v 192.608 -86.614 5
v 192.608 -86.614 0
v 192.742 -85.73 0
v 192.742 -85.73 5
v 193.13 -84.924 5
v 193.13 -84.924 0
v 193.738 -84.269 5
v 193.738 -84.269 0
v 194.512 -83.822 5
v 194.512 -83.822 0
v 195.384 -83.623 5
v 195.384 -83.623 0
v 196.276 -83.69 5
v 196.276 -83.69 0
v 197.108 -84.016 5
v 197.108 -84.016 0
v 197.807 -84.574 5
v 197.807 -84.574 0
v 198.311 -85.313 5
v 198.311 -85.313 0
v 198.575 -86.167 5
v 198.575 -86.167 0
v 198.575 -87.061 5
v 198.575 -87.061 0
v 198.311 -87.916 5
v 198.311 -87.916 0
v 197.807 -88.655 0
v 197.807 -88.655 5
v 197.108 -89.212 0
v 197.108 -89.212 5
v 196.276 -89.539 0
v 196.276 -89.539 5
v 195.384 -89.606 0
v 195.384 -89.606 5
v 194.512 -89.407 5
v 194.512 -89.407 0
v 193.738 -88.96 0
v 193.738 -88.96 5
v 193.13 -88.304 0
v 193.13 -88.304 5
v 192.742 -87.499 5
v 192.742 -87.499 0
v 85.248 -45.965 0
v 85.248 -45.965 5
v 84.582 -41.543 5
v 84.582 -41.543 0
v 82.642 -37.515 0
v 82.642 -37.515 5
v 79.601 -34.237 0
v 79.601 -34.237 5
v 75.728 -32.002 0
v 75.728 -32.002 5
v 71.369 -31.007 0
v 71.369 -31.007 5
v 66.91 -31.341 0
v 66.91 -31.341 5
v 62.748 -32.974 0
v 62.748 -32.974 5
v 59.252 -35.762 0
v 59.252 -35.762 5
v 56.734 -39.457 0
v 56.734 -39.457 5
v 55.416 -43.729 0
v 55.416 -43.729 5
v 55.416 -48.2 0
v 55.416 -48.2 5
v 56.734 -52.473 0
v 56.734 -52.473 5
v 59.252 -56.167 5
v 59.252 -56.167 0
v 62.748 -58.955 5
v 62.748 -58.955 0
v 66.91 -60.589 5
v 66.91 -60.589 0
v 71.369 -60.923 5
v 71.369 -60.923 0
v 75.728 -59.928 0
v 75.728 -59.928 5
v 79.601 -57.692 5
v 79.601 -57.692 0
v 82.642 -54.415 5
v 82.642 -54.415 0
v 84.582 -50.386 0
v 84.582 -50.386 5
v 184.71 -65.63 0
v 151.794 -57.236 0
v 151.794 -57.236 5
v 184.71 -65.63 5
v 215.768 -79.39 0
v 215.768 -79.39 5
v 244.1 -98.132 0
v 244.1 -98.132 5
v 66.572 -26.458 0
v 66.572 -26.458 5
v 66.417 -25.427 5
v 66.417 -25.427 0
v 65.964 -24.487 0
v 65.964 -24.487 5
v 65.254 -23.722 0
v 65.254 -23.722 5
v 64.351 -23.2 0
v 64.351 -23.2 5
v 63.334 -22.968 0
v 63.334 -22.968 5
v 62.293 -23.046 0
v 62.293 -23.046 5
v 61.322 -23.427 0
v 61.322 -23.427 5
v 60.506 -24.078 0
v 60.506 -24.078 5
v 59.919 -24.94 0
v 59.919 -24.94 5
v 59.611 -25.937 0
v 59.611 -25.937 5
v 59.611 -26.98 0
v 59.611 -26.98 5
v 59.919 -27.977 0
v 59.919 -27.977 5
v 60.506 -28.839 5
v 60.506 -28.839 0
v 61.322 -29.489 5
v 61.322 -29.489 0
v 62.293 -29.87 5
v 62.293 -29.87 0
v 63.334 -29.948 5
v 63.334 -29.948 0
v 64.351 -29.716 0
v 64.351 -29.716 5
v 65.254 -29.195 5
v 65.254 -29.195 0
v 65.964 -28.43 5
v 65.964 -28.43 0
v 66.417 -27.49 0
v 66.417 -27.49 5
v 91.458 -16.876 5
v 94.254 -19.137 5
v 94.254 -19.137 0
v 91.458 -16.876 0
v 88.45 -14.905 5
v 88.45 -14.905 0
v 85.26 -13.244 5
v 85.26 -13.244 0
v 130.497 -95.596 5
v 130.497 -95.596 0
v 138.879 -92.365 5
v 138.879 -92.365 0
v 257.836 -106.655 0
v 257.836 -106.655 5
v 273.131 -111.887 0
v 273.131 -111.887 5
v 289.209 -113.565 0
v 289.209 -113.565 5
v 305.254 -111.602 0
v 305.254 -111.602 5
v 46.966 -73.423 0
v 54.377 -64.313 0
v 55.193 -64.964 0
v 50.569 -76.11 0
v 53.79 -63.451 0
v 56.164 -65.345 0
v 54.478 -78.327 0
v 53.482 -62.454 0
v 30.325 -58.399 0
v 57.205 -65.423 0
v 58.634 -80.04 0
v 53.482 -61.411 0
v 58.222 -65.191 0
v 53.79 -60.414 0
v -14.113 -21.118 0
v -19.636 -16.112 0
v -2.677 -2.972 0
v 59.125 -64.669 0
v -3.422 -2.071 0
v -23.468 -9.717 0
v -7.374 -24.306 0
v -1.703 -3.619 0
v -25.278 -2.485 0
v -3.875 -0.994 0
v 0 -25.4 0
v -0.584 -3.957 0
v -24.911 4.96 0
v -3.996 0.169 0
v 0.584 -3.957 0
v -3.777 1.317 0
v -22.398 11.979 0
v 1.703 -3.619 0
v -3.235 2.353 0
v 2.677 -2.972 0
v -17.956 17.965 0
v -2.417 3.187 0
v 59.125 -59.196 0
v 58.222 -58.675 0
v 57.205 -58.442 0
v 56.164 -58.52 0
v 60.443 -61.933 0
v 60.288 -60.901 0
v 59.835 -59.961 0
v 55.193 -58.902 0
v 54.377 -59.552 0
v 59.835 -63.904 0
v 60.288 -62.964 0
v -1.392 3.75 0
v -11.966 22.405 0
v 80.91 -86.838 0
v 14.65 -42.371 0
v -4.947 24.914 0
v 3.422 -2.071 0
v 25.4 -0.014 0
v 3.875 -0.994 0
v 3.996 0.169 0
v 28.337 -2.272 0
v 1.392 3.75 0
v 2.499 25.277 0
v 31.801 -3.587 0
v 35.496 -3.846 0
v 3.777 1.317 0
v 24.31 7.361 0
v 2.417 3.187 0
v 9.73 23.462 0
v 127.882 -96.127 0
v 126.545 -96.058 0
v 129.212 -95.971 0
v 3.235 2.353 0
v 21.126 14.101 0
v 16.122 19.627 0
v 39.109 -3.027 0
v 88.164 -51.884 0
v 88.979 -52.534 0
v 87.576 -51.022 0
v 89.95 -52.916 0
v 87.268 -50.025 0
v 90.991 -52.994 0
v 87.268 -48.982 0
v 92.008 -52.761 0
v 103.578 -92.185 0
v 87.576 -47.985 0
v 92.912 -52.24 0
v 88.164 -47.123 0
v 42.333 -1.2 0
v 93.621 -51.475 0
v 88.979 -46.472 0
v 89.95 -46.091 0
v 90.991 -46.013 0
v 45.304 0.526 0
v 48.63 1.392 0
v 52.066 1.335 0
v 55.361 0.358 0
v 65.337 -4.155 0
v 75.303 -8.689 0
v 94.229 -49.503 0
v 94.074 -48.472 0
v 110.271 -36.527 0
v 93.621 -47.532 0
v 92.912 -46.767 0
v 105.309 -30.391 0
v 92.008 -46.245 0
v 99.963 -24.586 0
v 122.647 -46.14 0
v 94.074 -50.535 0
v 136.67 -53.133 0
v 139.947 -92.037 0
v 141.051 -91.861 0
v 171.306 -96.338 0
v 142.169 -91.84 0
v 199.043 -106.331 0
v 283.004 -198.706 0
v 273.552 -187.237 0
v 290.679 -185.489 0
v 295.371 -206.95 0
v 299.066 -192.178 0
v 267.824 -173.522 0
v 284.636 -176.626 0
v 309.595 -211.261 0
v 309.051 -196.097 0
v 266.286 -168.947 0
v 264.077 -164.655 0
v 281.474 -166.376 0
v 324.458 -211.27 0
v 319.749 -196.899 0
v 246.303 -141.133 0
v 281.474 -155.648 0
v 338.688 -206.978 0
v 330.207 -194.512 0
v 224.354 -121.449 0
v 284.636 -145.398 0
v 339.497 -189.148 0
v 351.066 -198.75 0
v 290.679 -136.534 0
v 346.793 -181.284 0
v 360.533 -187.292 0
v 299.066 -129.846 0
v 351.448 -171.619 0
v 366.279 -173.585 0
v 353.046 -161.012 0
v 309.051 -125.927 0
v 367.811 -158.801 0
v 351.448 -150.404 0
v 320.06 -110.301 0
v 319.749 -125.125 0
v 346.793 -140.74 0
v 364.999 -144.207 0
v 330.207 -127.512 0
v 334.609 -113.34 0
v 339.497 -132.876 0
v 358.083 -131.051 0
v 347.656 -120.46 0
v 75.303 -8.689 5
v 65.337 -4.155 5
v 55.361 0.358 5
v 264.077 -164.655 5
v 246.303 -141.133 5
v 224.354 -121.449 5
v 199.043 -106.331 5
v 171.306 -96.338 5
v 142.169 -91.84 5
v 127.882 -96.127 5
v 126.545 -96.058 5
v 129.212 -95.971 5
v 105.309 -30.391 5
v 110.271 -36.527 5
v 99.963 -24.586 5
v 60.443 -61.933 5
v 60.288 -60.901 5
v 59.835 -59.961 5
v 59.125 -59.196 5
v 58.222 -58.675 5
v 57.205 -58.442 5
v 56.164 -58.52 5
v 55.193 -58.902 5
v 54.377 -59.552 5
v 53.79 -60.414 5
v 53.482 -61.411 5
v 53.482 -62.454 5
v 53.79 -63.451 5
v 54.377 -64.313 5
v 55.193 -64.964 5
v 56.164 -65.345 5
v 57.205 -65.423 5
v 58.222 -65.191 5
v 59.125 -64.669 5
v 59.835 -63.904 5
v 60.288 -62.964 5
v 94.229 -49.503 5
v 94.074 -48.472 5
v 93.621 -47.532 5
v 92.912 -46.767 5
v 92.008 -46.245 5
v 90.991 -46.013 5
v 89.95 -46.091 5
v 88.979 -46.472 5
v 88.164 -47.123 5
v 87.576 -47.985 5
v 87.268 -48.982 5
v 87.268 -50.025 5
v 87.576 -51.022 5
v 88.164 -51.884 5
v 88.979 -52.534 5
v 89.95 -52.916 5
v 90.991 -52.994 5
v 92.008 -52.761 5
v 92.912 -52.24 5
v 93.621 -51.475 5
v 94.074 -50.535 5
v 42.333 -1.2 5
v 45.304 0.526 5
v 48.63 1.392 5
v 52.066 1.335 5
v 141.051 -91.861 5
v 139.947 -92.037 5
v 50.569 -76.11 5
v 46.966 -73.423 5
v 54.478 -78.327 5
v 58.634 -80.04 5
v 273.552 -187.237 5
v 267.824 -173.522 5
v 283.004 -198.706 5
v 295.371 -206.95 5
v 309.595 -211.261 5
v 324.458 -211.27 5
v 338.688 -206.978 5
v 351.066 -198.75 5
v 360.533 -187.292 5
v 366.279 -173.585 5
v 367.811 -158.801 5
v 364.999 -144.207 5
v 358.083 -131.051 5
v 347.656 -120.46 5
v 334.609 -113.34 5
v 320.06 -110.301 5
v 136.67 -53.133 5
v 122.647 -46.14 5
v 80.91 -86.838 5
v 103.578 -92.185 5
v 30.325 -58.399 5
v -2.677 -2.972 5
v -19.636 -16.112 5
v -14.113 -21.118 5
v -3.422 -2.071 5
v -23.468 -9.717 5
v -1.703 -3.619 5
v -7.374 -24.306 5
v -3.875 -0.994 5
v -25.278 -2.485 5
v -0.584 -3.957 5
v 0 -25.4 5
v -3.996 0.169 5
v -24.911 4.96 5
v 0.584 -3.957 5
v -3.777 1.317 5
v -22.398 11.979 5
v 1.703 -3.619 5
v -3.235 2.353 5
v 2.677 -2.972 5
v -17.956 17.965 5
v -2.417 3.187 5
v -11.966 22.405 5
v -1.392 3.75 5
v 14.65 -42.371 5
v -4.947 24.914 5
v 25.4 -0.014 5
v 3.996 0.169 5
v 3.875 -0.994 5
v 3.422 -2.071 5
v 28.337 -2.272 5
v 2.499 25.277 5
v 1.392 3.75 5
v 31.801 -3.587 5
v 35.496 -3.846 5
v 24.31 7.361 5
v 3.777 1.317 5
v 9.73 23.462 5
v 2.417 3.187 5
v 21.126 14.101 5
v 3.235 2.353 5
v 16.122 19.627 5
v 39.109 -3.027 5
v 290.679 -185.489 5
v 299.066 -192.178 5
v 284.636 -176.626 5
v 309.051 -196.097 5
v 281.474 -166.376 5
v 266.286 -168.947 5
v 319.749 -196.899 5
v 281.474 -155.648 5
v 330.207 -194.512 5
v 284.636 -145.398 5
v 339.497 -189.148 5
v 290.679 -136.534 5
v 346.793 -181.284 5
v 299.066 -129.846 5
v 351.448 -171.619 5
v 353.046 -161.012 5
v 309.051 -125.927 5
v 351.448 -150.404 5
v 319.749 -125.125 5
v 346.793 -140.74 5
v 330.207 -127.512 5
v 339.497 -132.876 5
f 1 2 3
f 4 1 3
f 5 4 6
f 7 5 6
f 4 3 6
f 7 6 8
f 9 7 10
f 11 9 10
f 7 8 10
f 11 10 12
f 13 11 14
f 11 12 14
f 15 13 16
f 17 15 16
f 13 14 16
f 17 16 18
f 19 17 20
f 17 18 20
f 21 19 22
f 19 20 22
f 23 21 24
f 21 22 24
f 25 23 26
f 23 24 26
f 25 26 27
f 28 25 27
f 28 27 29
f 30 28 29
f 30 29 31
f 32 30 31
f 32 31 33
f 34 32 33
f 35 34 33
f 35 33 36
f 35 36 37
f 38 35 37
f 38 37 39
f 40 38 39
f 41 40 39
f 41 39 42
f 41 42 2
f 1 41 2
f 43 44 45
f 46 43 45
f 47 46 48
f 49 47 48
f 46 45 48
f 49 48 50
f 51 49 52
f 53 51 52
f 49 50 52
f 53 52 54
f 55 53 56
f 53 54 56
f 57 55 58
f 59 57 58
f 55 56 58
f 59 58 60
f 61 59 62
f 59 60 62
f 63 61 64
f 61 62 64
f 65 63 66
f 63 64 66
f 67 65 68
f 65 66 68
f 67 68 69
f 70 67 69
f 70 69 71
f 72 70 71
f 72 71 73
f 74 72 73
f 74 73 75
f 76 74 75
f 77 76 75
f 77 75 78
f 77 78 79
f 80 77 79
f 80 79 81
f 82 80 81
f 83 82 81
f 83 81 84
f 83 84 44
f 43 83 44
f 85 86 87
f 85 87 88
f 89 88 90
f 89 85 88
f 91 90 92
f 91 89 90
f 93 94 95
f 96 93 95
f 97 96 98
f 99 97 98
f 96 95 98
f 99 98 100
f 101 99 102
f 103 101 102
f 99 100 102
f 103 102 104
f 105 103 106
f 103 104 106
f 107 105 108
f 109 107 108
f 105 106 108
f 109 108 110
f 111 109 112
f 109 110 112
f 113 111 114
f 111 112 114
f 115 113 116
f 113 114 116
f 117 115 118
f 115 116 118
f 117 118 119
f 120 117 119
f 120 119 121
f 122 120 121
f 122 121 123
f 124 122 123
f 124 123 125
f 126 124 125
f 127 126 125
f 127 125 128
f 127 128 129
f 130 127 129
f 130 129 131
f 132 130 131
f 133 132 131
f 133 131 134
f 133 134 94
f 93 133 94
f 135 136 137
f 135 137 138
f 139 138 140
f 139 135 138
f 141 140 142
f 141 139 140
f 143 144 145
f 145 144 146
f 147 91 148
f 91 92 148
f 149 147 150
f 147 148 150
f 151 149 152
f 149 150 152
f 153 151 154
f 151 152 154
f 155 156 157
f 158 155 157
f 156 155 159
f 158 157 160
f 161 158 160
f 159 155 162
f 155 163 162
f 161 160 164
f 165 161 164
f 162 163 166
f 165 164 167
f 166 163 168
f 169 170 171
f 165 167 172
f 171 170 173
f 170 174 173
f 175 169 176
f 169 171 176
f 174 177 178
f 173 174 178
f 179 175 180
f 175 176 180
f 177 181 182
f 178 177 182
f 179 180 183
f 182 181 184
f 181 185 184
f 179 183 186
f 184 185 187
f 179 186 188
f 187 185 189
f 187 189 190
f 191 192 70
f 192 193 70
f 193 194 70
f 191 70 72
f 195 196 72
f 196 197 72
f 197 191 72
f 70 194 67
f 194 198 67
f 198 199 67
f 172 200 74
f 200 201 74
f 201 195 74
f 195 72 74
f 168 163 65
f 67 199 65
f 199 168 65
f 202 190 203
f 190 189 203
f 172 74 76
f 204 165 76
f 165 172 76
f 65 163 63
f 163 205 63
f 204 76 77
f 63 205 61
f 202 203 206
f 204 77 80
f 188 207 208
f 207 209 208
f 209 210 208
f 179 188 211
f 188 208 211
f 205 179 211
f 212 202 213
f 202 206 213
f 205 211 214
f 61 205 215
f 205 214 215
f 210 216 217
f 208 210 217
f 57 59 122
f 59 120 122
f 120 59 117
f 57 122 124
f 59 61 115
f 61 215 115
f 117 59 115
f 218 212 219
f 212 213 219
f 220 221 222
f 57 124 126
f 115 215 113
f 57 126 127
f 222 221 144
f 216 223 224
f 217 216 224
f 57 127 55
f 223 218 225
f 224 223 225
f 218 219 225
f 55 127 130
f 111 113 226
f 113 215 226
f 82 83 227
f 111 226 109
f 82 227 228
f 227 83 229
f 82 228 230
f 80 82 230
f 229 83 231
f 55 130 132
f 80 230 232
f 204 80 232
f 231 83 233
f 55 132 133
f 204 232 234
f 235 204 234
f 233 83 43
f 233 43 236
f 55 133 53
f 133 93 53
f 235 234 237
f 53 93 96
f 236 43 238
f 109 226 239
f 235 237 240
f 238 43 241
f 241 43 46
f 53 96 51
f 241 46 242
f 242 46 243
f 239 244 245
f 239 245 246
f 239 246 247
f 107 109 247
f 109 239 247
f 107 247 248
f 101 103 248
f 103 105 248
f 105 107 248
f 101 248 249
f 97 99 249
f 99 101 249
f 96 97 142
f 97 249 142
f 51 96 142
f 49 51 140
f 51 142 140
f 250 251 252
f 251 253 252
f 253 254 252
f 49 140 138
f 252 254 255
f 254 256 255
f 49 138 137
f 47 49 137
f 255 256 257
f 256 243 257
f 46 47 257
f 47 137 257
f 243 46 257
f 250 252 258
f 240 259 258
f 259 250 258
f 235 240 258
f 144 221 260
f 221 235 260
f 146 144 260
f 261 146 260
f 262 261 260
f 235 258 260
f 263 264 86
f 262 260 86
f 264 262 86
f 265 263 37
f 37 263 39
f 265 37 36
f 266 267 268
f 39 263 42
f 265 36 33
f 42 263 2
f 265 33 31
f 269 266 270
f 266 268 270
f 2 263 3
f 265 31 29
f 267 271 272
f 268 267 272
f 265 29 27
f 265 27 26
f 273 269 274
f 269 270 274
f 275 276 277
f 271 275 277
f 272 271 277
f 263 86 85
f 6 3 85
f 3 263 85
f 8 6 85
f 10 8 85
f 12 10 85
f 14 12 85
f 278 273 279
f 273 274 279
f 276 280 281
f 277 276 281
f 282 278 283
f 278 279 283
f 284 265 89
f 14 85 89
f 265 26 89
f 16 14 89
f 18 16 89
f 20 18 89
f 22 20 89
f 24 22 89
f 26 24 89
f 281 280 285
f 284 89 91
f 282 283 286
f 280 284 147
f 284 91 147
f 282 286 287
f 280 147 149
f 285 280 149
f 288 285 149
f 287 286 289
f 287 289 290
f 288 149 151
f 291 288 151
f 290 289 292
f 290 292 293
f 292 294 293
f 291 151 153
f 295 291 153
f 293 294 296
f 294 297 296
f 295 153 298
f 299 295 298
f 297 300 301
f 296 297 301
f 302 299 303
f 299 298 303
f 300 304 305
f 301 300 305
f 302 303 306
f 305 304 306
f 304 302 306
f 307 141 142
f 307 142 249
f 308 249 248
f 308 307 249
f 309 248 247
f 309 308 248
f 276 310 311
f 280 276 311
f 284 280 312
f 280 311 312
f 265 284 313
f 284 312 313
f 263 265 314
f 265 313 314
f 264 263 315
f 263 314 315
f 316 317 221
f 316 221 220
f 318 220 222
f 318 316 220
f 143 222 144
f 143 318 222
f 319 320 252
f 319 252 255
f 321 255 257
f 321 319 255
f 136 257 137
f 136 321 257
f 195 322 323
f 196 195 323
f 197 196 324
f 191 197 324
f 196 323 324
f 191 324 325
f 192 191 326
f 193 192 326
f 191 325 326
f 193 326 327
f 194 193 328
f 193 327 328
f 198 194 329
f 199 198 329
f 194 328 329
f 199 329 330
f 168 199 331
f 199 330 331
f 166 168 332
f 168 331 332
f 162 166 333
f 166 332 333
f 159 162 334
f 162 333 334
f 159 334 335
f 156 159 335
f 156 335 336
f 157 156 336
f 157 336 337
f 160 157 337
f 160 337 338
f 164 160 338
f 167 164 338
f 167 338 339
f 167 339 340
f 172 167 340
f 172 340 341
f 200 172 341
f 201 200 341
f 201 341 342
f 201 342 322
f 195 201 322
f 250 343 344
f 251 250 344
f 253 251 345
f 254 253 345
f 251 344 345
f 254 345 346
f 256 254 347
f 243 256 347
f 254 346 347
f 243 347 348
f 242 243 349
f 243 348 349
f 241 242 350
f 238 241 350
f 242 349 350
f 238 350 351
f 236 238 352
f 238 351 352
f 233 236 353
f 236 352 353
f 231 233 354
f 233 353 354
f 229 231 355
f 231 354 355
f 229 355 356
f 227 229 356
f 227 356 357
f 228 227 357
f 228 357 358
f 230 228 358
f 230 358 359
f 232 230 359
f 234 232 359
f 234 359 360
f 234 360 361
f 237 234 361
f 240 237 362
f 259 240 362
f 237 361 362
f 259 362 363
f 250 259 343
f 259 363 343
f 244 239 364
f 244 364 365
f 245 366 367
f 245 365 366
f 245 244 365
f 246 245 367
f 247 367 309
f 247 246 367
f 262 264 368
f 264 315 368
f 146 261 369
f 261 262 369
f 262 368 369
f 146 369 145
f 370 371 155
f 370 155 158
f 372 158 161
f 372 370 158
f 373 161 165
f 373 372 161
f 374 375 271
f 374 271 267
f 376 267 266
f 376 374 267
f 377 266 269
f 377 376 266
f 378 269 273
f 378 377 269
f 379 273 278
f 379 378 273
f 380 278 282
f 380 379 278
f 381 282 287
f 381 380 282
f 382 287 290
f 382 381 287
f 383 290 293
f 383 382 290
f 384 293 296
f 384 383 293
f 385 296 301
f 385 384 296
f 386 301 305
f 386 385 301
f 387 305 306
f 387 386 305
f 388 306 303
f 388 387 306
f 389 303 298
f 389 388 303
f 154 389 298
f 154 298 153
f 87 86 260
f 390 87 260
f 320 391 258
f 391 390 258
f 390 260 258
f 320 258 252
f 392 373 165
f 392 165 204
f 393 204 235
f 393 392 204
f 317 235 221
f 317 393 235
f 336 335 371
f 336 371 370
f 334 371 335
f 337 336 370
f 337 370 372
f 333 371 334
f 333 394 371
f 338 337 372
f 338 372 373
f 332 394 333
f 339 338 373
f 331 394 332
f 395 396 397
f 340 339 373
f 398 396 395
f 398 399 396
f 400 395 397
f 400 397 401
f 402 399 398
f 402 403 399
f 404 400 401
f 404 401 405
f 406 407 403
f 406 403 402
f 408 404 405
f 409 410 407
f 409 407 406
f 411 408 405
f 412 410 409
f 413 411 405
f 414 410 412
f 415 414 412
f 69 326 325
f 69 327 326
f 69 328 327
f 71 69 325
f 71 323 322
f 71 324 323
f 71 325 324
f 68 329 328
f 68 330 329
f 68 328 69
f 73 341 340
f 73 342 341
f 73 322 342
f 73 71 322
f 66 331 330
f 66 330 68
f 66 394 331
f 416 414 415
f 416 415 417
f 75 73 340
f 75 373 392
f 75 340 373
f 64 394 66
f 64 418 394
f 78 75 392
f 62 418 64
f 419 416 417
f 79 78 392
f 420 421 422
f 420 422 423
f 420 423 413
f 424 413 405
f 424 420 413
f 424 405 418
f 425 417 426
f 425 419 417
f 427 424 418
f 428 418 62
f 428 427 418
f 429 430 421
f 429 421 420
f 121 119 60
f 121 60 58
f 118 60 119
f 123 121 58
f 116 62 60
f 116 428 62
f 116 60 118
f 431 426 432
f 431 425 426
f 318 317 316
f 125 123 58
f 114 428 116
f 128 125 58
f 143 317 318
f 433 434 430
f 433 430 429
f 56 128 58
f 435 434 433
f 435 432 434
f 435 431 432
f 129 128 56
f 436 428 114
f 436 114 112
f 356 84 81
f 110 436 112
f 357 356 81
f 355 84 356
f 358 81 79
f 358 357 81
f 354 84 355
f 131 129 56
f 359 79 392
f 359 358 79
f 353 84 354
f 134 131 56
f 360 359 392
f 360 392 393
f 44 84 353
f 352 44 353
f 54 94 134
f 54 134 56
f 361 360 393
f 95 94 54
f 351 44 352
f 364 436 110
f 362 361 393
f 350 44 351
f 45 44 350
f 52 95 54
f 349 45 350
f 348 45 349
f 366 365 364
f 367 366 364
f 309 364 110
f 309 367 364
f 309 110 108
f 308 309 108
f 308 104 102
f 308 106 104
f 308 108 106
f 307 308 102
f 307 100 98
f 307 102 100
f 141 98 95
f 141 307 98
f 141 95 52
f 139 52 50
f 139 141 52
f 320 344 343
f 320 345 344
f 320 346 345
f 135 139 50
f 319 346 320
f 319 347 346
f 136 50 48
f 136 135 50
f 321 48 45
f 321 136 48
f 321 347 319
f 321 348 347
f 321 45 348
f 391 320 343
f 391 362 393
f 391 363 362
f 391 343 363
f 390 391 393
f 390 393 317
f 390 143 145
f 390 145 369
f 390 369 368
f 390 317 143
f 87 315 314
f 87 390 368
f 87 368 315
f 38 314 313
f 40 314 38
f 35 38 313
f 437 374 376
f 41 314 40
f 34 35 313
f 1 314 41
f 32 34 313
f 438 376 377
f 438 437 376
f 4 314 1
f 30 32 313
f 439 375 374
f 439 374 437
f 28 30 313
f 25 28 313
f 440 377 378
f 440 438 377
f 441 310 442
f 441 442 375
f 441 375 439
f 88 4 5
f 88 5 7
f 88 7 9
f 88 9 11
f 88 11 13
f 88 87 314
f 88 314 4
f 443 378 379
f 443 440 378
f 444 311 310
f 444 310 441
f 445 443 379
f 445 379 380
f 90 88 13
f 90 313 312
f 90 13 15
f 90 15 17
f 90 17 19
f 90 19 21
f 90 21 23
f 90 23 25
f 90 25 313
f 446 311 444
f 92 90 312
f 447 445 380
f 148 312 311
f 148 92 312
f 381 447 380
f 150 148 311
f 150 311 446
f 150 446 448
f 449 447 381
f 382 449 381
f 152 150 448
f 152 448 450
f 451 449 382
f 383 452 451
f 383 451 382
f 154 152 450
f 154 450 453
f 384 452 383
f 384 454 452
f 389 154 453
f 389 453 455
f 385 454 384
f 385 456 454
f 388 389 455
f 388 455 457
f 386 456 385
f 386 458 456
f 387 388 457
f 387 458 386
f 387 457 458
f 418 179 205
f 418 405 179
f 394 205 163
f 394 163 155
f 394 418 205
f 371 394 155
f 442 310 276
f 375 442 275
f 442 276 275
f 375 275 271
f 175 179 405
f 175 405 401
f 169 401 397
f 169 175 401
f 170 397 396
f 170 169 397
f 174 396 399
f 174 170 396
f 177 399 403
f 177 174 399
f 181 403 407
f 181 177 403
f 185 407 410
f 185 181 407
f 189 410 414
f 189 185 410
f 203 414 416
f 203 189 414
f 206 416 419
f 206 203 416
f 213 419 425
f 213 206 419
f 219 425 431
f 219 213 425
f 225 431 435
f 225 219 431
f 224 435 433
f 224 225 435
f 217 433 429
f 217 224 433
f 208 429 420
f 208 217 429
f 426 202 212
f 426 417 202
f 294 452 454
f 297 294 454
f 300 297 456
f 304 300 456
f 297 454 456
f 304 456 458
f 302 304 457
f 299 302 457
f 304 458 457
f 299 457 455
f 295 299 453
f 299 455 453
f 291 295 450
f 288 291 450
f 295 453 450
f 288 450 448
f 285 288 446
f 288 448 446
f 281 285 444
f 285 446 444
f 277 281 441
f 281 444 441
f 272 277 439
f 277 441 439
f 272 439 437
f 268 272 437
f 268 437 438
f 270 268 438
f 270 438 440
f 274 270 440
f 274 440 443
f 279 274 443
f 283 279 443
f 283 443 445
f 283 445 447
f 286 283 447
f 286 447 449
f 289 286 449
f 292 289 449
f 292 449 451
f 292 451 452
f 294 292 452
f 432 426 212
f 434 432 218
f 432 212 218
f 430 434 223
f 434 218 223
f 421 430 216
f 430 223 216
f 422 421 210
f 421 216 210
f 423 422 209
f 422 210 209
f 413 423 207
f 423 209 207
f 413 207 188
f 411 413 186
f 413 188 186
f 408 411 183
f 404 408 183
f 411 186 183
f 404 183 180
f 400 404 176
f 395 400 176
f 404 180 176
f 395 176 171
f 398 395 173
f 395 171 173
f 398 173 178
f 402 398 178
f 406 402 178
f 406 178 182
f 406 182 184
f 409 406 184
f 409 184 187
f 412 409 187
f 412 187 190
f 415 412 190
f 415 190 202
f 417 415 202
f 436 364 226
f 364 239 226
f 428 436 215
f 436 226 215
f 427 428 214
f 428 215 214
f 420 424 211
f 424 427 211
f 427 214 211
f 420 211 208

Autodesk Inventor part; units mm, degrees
ref_plane "YZ Plane" through (0, 0, 0) normal (1, 0, 0) x (0, 1, 0)
ref_plane "XZ Plane" through (0, 0, 0) normal (0, 1, 0) x (-1, 0, 0)
ref_plane "XY Plane" through (0, 0, 0) normal (0, 0, 1) x (1, 0, 0)
sketch "DShaft" plane through (0, 0, 5) normal (0, 0, 1) x (1, 0, 0)
  circle A0 centre (0, 0) radius 4
  line L0 (-1.3919, 3.75) -> (1.3919, 3.75)
  dimension "d174" = 3.75
sketch "Sketch17" plane through (0, 0, 5) normal (0, 0, 1) x (1, 0, 0)
  arc A0 (55.3611, 0.3584) -> (42.3326, -1.2004) centre (50.1387, -11.2181) ccw
  arc A1 (55.3611, 0.3584) -> (35.2473, 5.0627) centre (33.3341, -48.4687) ccw
  arc A2 (25.4, -0.0141) -> (0, -25.4) centre (0, 0) ccw
  arc A3 (21.8139, 13.0121) -> (35.2473, 5.0627) centre (35.8302, 21.3728) ccw
  arc A4 (85.2601, -13.2441) -> (55.3611, 0.3584) centre (-2070.8473, -4712.7994) ccw
  arc A5 (25.4, -0.0141) -> (42.3326, -1.2004) centre (34.5266, 8.8174) ccw
sketch "Base" plane through (0, 0, 0) normal (0, 0, 1) x (1, 0, 0)
  circle A0 centre (0, 0) radius 25.4
  arc A1 (296.4611, -175.8738) -> (140.4514, -91.7589) centre (131.6761, -294.7694) ccw
  arc A2 (110.2711, -36.5273) -> (55.3611, 0.3584) centre (-26.1088, -180.2356) ccw
  arc A3 (110.2711, -36.5273) -> (151.7939, -57.2356) centre (164.9104, 21.0482) ccw
  arc A4 (244.1, -98.1325) -> (151.7939, -57.2356) centre (118.2154, -257.642) ccw
  arc A5 (244.1, -98.1325) -> (322.9398, -136.302) centre (369.9847, 61.3771) ccw
  arc A6 (339.7063, -172.5127) -> (322.9398, -136.302) centre (317.0592, -161.0119) ccw
  arc A7 (296.4611, -175.8738) -> (339.7063, -172.5127) centre (317.0592, -161.0119) ccw
  line L0 (128.6011, -96.3262) -> (140.4514, -91.7589)
  line L1 (0, 0) -> (317.0592, -161.0119) construction
  circle A8 centre (317.0592, -161.0119) radius 25.4 construction
  arc A9 (0, -25.4) -> (128.6011, -96.3262) centre (153.166, 100.265) ccw
  line L2 (0, 0) -> (0, -25.4) construction
  arc A10 (55.3611, 0.3584) -> (42.3326, -1.2004) centre (50.1387, -11.2181) ccw
  arc A11 (25.4, -0.0141) -> (42.3326, -1.2004) centre (34.5266, 8.8174) ccw
  line L3 (110.2711, -36.5273) -> (102.4101, -52.0068) construction
  line L4 (50.1387, -11.2181) -> (44.3883, -22.5417) construction
  line L5 (140.4514, -91.7589) -> (148.7008, -75.5146) construction
  line L6 (244.1, -98.1325) -> (233.6726, -118.6658) construction
  line L7 (339.7063, -172.5127) -> (317.0592, -161.0119) construction
  dimension "d101" = 50.8
  dimension "d98" = 355.6
  dimension "d99" = 203.2
  dimension "d100" = 79.375
  dimension "d102" = 198.12
  dimension "d103" = 50.8
  dimension "d104" = 12.7
  dimension "d105" = 203.2
  dimension "d106" = 48
  dimension "d107" = 12.7
  dimension "d108" = 12.7
  dimension "d109" = 23.495
  dimension "d111" = 158.75
  dimension "d112" = 222.25
  dimension "d113" = 49.784
  dimension "d114" = 65.0748
  dimension "d115" = 51.9176
  dimension "d116" = 95.3008
  dimension "d117" = 93.5228
extrude "Plate1" add sketch "Base" along normal blind 5
sketch "MountHoles" plane through (0, 0, 5) normal (0, 0, 1) x (1, 0, 0)
  arc A0 (296.4611, -175.8738) -> (322.9398, -136.302) centre (317.0592, -161.0119) ccw projected
  circle A1 centre (317.0592, -161.0119) radius 3.175
  circle A2 centre (0, 0) radius 3.175
  circle A3 centre (0, 0) radius 15.875 construction
  circle A4 centre (0, 15.875) radius 3.175
  line L0 (0, 15.875) -> (0, 0) construction
  circle A5 centre (-13.7482, 7.9375) radius 3.175
  circle A6 centre (-13.7482, -7.9375) radius 3.175
  circle A7 centre (0, -15.875) radius 3.175
  circle A8 centre (13.7482, -7.9375) radius 3.175
  circle A9 centre (13.7482, 7.9375) radius 3.175
  point P0 (278.6053, -195.7416)
  point P1 (14.9365, 6.9557)
  dimension "d40" = 31.75
  dimension "d38" = 6.35
  dimension "d39" = 6.35
  dimension "d43" = 360
hole "MountHolesFeature" at (0, 0, 5) direction (0, 0, -1) diameter 8 end through all
fillet "SmallFilletsFeature" radius 8 2 edges at (140.4514, -91.7589, 2.5) (128.6011, -96.3262, 2.5)
sketch "WheelMountHole" plane through (0, 0, 5) normal (0, 0, 1) x (1, 0, 0)
  arc A0 (296.4611, -175.8738) -> (322.9398, -136.302) centre (317.0592, -161.0119) ccw projected
  circle A1 centre (317.0592, -161.0119) radius 6.35
  point P0 (0, 0)
  point P1 (278.6053, -195.7416)
  dimension "d83" = 12.7
hole "WheelMountHoleFeature" at (317.0592, -161.0119, 5) direction (0, 0, -1) diameter 24.5 end through all
sketch "PistonMountHole" plane through (0, 0, 0) normal (0, 0, -1) x (-1, 0, 0)
  circle A0 centre (-195.6083, -86.6143) radius 3
  arc A1 (-151.7939, -57.2356) -> (-244.1, -98.1325) centre (-118.2154, -257.642) ccw projected
  line L0 (-206.4619, -74.6043) -> (-184.7548, -98.6243) construction
  arc A2 (-142.169, -91.8405) -> (-296.4611, -175.8738) centre (-131.6761, -294.7694) ccw projected
  point P0 (0, 0)
  dimension "d120" = 6
  dimension "d122" = 203.2
extrude "PistonMountHoleFeature" cut sketch "PistonMountHole" against normal blind 5
sketch "MotorExtend" plane through (0, 0, 5) normal (0, 0, 1) x (1, 0, 0)
  circle A0 centre (70.2482, -45.9648) radius 36
  arc A1 (0, -25.4) -> (126.5447, -96.0583) centre (153.166, 100.265) ccw construction
  arc A2 (110.2711, -36.5273) -> (151.7939, -57.2356) centre (164.9104, 21.0482) ccw construction
  circle A3 centre (0, 0) radius 4
  line L0 (0, 0) -> (140.4963, -91.9296) construction
  arc A4 (142.169, -91.8405) -> (138.8789, -92.365) centre (141.7559, -99.8298) ccw
  arc A5 (0, -25.4) -> (46.966, -73.4228) centre (280.2614, 201.7164) ccw
  arc A6 (126.5447, -96.0583) -> (130.4966, -95.5956) centre (127.6196, -88.1308) ccw
  arc A7 (58.6335, -80.0397) -> (126.5447, -96.0583) centre (175.0163, 261.4034) ccw
  arc A8 (55.3611, 0.3584) -> (42.3326, -1.2004) centre (50.1387, -11.2181) ccw
  arc A9 (85.2601, -13.2441) -> (55.3611, 0.3584) centre (-2070.8473, -4712.7994) ccw
  arc A10 (110.2711, -36.5273) -> (55.3611, 0.3584) centre (-26.1088, -180.2356) ccw
  arc A11 (110.2711, -36.5273) -> (94.2542, -19.1374) centre (12.4591, -110.5454) ccw
  line L1 (0, -25.4) -> (55.3611, 0.3584)
  line L2 (110.2711, -36.5273) -> (126.5447, -96.0583)
  point P0 (70.2482, -45.9648)
  dimension "d128" = 72
sheet face with bend "MotorExtendFeature" sketch "MotorExtend" thickness 5 toward (0, 0, -1) bend radius 5 contours A0 A10 | A11 A10 A0 | A0 A10 A9 | A10 L2 A7 A0 | A0 A10 | A0 A5 L1 A10
bend "Bend1"
sketch "MotorCut" plane through (0, 0, 5) normal (0, 0, 1) x (1, 0, 0)
  circle A0 centre (70.2482, -45.9648) radius 36 projected
  circle A1 centre (70.2482, -45.9648) radius 15
  point P0 (0, 0)
  dimension "d134" = 30
extrude "MotorCutFeature" cut sketch "MotorCut" against normal blind 5 contours A1
sketch "MotorMountHoles" plane through (0, 0, 5) normal (0, 0, 1) x (1, 0, 0)
  circle A0 centre (56.943, -61.9327) radius 3.5 projected
  circle A1 centre (63.0721, -26.4582) radius 3.5 projected
  circle A2 centre (90.7293, -49.5034) radius 3.5 projected
  point P0 (0, 0)
extrude "MotorMountHolesFeature" cut sketch "MotorMountHoles" against normal blind 5
sketch "HubCoverExtend" plane through (0, 0, 5) normal (0, 0, 1) x (1, 0, 0)
  circle A0 centre (317.0592, -161.0119) radius 12.25
  circle A1 centre (317.0592, -161.0119) radius 50.8
  arc A2 (244.1, -98.1325) -> (322.9398, -136.302) centre (369.9847, 61.3771) ccw
  arc A3 (296.4611, -175.8738) -> (142.169, -91.8405) centre (131.6761, -294.7694) ccw
  arc A4 (244.1, -98.1325) -> (305.2545, -111.6025) centre (288.573, -41.7804) ccw
  arc A5 (266.9914, -169.606) -> (228.8665, -116.3198) centre (192.9202, -182.3202) ccw
  point P0 (0, 0)
  point P1 (283.7795, -122.6308)
  point P2 (268.8853, -144.8899)
  dimension "d139" = 101.6
sheet face with bend "HubCoverExtendFeature" sketch "HubCoverExtend" thickness 5 toward (0, 0, -1) bend radius 5
bend "Bend2"
sketch "HubPressFitHole" plane through (0, 0, 5) normal (0, 0, 1) x (1, 0, 0)
  circle A0 centre (317.0592, -161.0119) radius 12.25 projected
  circle A1 centre (317.0592, -161.0119) radius 35.9873
  point P0 (0, 0)
  dimension "d145" = 71.9746
extrude "HubPressFitHoleFeature" cut sketch "HubPressFitHole" against normal blind 5 contours A0 | A1
sketch "ShinThicken" plane through (0, 0, 5) normal (0, 0, 1) x (1, 0, 0)
  arc A0 (266.9914, -169.606) -> (228.8665, -116.3198) centre (192.9202, -182.3202) ccw
  arc A1 (228.8665, -116.3198) -> (142.169, -91.8405) centre (131.6761, -294.7694) ccw
  arc A2 (266.9914, -169.606) -> (142.169, -91.8405) centre (133.4629, -244.8745) ccw
  point P0 (0, 0)
sheet face with bend "ShinThickenFeature" sketch "ShinThicken" thickness 5 toward (0, 0, -1) bend radius 5
bend "Bend3"
fillet "BlendFilletFeature" radius 32 1 edges at (266.9914, -169.606, 2.5)
sheet face with bend "DShaftFeature" sketch "DShaft" thickness 5 toward (0, 0, -1) bend radius 5 picked at (-0.1576, 3.824) contours L0 A0
bend "Bend6"
equation "\"d66\" = Thickness"
equation "\"d89\" = Thickness"
equation "\"d37\" = Thickness"
equation "\"BendRadius\" = Thickness"
equation "\"BendReliefWidth\" = Thickness"
equation "\"BendReliefDepth\" = 0.5 * Thickness"
equation "\"TransitionRadius\" = BendRadius"
equation "\"JacobiRadiusSize\" = BendRadius"
equation "\"GapSize\" = Thickness"
equation "\"Thickness\" = 5"
properties part number "LowerLeg"
